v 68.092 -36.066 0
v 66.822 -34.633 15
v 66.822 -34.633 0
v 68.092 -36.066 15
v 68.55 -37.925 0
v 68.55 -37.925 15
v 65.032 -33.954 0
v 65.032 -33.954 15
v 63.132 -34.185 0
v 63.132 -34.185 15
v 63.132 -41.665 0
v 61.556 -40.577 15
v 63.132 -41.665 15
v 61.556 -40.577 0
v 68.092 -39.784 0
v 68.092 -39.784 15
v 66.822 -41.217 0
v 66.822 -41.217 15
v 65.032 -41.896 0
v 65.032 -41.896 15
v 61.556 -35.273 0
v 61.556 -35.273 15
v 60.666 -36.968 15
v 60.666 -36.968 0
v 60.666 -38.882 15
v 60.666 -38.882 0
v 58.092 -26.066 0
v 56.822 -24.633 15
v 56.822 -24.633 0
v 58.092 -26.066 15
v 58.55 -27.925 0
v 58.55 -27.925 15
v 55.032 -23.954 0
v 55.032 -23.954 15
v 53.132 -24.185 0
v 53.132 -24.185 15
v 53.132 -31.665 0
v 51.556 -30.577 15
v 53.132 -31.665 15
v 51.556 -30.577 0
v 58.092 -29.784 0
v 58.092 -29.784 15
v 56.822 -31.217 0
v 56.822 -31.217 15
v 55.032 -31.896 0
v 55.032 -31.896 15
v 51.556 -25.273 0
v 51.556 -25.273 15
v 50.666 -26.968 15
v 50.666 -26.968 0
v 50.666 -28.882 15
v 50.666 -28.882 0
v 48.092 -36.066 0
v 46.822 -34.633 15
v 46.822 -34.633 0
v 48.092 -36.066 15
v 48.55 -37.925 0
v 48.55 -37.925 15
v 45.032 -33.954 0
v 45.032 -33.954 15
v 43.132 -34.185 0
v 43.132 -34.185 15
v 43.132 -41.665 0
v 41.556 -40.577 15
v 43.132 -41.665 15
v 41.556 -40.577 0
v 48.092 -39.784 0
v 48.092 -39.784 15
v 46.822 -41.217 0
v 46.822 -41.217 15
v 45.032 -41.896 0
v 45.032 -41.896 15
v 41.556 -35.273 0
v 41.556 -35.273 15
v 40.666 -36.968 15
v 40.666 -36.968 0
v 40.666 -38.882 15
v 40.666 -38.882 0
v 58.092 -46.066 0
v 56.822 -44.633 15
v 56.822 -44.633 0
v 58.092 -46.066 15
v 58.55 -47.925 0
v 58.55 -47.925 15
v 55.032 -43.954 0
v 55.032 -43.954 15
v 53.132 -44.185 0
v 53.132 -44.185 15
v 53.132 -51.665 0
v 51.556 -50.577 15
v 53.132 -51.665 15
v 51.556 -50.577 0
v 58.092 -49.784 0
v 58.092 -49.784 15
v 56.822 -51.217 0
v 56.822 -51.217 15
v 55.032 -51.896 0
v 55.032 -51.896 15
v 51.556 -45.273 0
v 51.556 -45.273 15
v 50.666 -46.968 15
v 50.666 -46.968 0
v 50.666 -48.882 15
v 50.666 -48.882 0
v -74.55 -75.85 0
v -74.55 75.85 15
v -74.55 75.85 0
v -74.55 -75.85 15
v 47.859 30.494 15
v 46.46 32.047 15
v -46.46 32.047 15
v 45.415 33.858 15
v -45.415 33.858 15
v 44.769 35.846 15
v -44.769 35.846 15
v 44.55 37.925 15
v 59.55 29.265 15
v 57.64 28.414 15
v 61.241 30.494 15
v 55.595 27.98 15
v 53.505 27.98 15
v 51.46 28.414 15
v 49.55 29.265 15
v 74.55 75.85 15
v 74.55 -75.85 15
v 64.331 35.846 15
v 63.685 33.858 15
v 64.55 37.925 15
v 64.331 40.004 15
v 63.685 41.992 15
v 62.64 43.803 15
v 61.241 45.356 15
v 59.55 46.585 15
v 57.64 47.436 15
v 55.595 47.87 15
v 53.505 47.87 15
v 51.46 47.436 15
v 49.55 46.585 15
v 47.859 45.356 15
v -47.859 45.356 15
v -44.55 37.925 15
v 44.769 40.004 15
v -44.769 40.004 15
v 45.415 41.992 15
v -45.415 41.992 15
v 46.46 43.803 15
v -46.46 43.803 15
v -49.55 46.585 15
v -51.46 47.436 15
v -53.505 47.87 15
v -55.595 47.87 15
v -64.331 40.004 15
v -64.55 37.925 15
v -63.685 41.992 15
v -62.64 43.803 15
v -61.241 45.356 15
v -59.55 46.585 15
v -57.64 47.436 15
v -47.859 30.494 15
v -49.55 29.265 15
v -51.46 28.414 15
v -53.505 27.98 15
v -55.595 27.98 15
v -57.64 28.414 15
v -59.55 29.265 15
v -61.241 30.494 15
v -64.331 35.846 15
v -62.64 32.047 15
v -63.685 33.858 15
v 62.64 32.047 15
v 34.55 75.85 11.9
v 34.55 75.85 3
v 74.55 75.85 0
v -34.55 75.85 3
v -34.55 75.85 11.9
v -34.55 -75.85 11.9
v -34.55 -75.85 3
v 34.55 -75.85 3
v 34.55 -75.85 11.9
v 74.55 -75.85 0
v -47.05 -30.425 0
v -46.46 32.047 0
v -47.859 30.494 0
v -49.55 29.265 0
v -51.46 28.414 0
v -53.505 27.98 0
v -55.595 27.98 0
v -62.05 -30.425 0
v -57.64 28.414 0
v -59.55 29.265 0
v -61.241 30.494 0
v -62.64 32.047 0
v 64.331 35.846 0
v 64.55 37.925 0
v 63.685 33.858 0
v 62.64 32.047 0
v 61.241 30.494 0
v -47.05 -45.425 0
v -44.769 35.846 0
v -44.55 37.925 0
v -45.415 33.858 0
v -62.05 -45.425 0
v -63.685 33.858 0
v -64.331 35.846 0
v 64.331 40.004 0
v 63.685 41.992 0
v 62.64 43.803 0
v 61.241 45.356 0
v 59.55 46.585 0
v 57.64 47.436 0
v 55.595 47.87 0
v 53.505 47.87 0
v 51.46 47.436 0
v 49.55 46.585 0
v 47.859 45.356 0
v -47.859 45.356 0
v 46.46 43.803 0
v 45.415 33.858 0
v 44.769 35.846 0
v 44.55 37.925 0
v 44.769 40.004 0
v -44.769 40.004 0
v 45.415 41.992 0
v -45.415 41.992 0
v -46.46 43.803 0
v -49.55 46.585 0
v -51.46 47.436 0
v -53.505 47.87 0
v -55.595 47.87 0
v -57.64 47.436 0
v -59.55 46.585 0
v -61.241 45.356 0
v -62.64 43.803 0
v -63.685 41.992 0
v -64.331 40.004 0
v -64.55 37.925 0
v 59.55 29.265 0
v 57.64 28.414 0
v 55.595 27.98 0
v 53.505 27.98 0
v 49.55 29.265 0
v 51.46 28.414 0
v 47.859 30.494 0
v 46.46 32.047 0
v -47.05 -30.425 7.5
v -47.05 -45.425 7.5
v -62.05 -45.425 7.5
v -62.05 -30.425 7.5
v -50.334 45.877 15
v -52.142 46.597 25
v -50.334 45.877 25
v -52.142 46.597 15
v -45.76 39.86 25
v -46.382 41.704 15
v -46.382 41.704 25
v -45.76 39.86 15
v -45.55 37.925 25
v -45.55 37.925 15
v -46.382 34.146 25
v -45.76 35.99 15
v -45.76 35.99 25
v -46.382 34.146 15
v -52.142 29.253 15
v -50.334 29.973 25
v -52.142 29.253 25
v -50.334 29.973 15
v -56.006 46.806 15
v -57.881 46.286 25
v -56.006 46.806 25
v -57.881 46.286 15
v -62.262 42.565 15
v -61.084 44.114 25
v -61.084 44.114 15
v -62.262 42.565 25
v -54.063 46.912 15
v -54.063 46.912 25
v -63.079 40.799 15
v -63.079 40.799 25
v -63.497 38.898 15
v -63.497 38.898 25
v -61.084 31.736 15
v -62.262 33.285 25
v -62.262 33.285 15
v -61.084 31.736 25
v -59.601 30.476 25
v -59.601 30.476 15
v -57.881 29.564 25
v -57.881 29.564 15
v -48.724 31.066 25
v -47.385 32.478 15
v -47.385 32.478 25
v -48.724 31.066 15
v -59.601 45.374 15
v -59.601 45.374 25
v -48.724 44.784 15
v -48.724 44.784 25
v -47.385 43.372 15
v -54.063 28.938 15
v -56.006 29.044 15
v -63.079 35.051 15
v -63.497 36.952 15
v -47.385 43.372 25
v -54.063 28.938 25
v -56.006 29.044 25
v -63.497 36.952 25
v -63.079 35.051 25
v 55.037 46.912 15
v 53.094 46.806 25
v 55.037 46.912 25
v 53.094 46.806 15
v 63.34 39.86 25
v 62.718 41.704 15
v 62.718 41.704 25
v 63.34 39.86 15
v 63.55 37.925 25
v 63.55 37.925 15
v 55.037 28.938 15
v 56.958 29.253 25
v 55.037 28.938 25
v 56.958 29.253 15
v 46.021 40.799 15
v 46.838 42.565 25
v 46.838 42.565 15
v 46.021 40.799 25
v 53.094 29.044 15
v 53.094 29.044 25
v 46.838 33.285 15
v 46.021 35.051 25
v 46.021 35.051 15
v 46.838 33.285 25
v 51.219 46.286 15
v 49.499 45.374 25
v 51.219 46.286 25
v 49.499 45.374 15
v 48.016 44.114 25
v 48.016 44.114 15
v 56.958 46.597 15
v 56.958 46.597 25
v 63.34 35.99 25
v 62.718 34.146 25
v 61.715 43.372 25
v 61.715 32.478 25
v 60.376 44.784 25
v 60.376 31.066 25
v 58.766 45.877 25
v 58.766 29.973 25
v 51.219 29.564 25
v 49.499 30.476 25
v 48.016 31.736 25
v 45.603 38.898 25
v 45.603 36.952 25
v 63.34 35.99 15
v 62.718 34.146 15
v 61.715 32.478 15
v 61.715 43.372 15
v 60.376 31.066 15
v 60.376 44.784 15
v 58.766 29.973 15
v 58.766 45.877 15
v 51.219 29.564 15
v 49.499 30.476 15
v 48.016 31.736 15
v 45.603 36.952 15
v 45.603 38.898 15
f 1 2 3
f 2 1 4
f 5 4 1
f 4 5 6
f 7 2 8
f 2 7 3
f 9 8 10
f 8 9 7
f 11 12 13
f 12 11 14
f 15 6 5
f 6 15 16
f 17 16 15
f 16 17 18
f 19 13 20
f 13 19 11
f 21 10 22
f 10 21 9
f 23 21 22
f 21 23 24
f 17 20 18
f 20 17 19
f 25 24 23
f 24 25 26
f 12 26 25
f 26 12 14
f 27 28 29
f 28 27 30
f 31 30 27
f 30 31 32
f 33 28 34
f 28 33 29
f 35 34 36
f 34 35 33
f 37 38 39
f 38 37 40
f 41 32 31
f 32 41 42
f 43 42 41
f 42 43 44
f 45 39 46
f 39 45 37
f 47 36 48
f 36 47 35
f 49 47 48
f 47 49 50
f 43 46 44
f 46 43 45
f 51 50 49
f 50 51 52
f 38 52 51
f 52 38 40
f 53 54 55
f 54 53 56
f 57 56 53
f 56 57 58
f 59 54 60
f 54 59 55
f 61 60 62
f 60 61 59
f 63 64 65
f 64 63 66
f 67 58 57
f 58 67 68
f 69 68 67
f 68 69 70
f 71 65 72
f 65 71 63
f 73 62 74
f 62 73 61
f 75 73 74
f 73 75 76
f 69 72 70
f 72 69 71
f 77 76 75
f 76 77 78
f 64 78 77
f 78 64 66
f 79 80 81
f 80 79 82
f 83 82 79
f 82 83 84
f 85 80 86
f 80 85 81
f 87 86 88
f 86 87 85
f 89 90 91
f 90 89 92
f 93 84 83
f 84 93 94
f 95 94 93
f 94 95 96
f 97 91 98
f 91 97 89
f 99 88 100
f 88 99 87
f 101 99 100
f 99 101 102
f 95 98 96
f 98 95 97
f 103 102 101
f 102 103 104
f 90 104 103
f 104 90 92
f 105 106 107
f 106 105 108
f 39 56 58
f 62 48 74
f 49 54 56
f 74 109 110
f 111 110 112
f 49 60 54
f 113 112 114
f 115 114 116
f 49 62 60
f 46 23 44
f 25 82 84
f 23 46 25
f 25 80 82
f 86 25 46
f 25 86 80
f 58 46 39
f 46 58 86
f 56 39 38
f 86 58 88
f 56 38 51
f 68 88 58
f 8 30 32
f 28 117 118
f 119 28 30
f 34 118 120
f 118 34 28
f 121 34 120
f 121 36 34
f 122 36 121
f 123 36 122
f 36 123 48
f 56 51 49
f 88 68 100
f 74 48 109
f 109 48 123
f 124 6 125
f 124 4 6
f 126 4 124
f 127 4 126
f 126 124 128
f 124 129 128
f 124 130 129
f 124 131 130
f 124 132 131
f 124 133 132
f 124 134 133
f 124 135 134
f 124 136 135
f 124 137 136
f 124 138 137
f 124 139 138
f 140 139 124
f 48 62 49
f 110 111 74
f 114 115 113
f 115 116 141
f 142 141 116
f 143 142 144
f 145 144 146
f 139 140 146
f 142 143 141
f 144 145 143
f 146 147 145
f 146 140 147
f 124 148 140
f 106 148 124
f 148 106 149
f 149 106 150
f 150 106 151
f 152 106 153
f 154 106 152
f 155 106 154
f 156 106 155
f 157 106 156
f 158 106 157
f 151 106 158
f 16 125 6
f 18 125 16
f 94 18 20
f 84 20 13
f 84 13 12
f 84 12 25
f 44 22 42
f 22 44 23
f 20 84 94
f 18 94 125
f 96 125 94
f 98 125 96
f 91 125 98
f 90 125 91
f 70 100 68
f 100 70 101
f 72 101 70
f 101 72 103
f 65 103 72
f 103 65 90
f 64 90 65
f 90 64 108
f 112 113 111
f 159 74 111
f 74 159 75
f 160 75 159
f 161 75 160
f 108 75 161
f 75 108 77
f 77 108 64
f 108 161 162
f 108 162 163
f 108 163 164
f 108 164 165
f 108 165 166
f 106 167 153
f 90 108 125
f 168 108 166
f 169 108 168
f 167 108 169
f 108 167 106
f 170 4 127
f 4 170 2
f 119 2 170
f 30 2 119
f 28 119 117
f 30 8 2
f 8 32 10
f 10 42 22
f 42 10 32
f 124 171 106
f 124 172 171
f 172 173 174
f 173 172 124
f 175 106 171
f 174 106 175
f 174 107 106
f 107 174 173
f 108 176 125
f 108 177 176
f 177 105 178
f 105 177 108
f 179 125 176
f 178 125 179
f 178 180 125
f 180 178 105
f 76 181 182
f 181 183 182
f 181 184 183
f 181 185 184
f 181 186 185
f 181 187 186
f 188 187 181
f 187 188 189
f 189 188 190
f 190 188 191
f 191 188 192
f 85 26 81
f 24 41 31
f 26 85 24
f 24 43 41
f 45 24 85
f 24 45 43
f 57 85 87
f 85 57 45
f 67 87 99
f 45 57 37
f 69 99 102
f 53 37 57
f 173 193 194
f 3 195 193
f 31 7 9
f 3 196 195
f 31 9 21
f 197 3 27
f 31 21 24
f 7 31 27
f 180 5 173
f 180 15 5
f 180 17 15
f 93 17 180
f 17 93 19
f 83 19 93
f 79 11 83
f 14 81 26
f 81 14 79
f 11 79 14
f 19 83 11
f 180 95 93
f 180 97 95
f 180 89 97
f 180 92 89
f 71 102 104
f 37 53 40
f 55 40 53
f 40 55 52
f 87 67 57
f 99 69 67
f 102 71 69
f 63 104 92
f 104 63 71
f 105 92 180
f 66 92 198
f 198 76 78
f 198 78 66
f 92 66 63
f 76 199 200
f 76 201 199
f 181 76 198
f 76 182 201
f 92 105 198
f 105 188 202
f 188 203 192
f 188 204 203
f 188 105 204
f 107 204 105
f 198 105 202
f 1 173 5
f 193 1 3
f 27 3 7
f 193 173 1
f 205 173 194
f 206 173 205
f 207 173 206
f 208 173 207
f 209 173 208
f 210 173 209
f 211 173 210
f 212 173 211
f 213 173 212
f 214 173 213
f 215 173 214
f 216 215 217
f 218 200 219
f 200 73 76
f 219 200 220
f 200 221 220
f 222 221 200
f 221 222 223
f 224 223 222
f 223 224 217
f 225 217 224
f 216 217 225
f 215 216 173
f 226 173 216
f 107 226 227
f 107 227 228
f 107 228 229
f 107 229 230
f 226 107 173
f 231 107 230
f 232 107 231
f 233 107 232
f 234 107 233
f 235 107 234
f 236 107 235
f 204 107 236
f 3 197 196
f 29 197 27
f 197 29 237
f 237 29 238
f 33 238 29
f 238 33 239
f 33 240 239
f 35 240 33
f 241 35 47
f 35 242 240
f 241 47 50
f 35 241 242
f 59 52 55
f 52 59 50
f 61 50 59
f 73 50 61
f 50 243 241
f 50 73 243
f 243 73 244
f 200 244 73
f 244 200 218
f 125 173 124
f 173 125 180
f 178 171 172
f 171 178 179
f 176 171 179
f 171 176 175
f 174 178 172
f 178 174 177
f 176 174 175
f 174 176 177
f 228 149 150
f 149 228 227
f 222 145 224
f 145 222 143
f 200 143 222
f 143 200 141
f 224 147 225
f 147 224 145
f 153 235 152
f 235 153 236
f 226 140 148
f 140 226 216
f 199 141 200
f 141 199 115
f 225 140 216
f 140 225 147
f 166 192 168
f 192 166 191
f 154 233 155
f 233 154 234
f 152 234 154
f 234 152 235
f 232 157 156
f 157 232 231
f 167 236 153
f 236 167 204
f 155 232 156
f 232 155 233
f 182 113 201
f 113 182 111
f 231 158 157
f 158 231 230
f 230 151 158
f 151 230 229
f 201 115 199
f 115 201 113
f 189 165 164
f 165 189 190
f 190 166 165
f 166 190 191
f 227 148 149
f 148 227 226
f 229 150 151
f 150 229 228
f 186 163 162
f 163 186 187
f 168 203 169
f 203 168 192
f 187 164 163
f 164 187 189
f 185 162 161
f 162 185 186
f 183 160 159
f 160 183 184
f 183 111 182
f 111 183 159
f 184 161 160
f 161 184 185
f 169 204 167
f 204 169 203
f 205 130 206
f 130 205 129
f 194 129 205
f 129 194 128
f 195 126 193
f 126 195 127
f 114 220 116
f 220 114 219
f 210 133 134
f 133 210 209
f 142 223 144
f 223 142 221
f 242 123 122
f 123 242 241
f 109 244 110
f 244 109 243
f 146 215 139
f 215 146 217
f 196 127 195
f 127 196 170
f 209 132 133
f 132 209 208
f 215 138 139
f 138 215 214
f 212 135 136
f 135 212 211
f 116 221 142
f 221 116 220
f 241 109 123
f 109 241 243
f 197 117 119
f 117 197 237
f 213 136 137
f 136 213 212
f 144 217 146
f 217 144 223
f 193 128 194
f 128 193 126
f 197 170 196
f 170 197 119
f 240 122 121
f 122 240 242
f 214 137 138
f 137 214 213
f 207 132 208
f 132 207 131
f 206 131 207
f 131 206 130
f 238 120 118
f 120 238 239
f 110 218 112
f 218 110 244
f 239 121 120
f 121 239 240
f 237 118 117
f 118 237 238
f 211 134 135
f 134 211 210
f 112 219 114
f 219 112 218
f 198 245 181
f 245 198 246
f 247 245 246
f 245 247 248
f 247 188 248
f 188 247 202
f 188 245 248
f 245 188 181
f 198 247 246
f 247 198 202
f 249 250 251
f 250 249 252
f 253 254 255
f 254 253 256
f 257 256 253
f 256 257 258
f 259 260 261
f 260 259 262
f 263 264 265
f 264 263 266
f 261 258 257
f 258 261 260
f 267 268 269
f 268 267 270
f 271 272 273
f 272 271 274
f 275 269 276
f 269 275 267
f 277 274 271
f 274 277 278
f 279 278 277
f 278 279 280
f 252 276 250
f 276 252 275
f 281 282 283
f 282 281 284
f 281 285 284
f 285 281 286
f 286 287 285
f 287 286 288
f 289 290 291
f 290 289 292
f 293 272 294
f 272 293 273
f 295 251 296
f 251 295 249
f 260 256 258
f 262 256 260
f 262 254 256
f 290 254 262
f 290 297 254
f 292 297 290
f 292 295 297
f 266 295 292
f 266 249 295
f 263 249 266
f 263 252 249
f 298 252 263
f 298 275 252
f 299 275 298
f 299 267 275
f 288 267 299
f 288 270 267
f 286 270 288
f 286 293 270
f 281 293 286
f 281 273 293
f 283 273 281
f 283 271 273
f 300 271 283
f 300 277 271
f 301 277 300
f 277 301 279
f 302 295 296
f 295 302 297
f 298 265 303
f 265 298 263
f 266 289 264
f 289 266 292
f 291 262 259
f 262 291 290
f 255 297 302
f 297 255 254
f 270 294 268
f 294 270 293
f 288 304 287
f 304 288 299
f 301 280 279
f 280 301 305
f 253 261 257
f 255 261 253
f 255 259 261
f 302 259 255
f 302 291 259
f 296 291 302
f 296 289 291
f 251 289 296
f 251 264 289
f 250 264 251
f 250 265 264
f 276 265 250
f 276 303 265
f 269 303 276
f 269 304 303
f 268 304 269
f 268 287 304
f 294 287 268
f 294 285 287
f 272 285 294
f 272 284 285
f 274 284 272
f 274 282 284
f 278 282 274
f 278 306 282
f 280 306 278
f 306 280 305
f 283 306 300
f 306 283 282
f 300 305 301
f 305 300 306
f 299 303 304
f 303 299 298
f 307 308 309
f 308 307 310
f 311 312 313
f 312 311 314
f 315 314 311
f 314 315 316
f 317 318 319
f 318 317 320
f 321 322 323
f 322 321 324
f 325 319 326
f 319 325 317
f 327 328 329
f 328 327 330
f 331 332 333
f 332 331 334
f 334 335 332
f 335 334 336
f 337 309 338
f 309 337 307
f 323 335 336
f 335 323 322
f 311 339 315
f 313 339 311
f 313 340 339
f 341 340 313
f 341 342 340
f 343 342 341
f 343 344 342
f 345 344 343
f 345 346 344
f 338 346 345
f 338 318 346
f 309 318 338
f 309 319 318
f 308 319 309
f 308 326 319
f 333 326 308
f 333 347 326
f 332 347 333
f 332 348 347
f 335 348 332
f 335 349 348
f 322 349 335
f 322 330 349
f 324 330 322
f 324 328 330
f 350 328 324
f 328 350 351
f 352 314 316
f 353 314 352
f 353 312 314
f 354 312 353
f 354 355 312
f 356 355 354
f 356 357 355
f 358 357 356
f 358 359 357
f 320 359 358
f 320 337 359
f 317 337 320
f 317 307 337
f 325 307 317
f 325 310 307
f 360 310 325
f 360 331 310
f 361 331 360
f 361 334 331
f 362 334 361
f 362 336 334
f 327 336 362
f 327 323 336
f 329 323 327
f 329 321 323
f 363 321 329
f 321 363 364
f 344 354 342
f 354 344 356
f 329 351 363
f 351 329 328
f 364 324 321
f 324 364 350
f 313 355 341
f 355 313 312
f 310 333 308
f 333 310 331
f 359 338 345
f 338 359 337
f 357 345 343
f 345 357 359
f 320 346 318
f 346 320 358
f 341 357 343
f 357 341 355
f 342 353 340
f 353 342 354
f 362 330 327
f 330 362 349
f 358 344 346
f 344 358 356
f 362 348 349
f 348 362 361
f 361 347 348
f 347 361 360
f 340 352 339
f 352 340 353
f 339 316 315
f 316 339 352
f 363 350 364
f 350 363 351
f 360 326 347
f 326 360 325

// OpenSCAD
// Simple NucDeck Demo Assembly
// Simplified version that works reliably for web demonstration

// Parameters
phone_width = 69.1;
phone_height = 151.7;
phone_depth = 7.9;
case_thickness = 3;
grip_width = 40;
case_height = 15;

// Main assembly
module demo_nucdeck() {
    // Main case body
    difference() {
        // Outer case
        hull() {
            translate([-phone_width/2 - grip_width, -phone_height/2, 0])
                cube([phone_width + 2*grip_width, phone_height, case_height]);
        }
        
        // Phone cutout
        translate([-phone_width/2, -phone_height/2, case_thickness])
            cube([phone_width, phone_height, phone_depth + 1]);
        
        // Left joystick hole
        translate([-phone_width/2 - grip_width/2, phone_height/4, -1])
            cylinder(d=20, h=case_height + 2);
        
        // Right joystick hole
        translate([phone_width/2 + grip_width/2, phone_height/4, -1])
            cylinder(d=20, h=case_height + 2);
        
        // D-pad area
        translate([-phone_width/2 - grip_width/2, -phone_height/4, -1])
            cube([15, 15, case_height + 2], center=true);
        
        // ABXY buttons
        for(i = [0:3]) {
            angle = i * 90;
            translate([phone_width/2 + grip_width/2 + 10*cos(angle), -phone_height/4 + 10*sin(angle), -1])
                cylinder(d=8, h=case_height + 2);
        }
    }
    
    // Phone mockup (optional)
    if ($preview) {
        color("black", 0.3)
        translate([-phone_width/2, -phone_height/2, case_thickness])
            cube([phone_width, phone_height, phone_depth]);
    }
    
    // Joystick mockups
    color("red", 0.7) {
        translate([-phone_width/2 - grip_width/2, phone_height/4, case_height])
            cylinder(d=18, h=10);
        translate([phone_width/2 + grip_width/2, phone_height/4, case_height])
            cylinder(d=18, h=10);
    }
}

// Render the demo
demo_nucdeck();
